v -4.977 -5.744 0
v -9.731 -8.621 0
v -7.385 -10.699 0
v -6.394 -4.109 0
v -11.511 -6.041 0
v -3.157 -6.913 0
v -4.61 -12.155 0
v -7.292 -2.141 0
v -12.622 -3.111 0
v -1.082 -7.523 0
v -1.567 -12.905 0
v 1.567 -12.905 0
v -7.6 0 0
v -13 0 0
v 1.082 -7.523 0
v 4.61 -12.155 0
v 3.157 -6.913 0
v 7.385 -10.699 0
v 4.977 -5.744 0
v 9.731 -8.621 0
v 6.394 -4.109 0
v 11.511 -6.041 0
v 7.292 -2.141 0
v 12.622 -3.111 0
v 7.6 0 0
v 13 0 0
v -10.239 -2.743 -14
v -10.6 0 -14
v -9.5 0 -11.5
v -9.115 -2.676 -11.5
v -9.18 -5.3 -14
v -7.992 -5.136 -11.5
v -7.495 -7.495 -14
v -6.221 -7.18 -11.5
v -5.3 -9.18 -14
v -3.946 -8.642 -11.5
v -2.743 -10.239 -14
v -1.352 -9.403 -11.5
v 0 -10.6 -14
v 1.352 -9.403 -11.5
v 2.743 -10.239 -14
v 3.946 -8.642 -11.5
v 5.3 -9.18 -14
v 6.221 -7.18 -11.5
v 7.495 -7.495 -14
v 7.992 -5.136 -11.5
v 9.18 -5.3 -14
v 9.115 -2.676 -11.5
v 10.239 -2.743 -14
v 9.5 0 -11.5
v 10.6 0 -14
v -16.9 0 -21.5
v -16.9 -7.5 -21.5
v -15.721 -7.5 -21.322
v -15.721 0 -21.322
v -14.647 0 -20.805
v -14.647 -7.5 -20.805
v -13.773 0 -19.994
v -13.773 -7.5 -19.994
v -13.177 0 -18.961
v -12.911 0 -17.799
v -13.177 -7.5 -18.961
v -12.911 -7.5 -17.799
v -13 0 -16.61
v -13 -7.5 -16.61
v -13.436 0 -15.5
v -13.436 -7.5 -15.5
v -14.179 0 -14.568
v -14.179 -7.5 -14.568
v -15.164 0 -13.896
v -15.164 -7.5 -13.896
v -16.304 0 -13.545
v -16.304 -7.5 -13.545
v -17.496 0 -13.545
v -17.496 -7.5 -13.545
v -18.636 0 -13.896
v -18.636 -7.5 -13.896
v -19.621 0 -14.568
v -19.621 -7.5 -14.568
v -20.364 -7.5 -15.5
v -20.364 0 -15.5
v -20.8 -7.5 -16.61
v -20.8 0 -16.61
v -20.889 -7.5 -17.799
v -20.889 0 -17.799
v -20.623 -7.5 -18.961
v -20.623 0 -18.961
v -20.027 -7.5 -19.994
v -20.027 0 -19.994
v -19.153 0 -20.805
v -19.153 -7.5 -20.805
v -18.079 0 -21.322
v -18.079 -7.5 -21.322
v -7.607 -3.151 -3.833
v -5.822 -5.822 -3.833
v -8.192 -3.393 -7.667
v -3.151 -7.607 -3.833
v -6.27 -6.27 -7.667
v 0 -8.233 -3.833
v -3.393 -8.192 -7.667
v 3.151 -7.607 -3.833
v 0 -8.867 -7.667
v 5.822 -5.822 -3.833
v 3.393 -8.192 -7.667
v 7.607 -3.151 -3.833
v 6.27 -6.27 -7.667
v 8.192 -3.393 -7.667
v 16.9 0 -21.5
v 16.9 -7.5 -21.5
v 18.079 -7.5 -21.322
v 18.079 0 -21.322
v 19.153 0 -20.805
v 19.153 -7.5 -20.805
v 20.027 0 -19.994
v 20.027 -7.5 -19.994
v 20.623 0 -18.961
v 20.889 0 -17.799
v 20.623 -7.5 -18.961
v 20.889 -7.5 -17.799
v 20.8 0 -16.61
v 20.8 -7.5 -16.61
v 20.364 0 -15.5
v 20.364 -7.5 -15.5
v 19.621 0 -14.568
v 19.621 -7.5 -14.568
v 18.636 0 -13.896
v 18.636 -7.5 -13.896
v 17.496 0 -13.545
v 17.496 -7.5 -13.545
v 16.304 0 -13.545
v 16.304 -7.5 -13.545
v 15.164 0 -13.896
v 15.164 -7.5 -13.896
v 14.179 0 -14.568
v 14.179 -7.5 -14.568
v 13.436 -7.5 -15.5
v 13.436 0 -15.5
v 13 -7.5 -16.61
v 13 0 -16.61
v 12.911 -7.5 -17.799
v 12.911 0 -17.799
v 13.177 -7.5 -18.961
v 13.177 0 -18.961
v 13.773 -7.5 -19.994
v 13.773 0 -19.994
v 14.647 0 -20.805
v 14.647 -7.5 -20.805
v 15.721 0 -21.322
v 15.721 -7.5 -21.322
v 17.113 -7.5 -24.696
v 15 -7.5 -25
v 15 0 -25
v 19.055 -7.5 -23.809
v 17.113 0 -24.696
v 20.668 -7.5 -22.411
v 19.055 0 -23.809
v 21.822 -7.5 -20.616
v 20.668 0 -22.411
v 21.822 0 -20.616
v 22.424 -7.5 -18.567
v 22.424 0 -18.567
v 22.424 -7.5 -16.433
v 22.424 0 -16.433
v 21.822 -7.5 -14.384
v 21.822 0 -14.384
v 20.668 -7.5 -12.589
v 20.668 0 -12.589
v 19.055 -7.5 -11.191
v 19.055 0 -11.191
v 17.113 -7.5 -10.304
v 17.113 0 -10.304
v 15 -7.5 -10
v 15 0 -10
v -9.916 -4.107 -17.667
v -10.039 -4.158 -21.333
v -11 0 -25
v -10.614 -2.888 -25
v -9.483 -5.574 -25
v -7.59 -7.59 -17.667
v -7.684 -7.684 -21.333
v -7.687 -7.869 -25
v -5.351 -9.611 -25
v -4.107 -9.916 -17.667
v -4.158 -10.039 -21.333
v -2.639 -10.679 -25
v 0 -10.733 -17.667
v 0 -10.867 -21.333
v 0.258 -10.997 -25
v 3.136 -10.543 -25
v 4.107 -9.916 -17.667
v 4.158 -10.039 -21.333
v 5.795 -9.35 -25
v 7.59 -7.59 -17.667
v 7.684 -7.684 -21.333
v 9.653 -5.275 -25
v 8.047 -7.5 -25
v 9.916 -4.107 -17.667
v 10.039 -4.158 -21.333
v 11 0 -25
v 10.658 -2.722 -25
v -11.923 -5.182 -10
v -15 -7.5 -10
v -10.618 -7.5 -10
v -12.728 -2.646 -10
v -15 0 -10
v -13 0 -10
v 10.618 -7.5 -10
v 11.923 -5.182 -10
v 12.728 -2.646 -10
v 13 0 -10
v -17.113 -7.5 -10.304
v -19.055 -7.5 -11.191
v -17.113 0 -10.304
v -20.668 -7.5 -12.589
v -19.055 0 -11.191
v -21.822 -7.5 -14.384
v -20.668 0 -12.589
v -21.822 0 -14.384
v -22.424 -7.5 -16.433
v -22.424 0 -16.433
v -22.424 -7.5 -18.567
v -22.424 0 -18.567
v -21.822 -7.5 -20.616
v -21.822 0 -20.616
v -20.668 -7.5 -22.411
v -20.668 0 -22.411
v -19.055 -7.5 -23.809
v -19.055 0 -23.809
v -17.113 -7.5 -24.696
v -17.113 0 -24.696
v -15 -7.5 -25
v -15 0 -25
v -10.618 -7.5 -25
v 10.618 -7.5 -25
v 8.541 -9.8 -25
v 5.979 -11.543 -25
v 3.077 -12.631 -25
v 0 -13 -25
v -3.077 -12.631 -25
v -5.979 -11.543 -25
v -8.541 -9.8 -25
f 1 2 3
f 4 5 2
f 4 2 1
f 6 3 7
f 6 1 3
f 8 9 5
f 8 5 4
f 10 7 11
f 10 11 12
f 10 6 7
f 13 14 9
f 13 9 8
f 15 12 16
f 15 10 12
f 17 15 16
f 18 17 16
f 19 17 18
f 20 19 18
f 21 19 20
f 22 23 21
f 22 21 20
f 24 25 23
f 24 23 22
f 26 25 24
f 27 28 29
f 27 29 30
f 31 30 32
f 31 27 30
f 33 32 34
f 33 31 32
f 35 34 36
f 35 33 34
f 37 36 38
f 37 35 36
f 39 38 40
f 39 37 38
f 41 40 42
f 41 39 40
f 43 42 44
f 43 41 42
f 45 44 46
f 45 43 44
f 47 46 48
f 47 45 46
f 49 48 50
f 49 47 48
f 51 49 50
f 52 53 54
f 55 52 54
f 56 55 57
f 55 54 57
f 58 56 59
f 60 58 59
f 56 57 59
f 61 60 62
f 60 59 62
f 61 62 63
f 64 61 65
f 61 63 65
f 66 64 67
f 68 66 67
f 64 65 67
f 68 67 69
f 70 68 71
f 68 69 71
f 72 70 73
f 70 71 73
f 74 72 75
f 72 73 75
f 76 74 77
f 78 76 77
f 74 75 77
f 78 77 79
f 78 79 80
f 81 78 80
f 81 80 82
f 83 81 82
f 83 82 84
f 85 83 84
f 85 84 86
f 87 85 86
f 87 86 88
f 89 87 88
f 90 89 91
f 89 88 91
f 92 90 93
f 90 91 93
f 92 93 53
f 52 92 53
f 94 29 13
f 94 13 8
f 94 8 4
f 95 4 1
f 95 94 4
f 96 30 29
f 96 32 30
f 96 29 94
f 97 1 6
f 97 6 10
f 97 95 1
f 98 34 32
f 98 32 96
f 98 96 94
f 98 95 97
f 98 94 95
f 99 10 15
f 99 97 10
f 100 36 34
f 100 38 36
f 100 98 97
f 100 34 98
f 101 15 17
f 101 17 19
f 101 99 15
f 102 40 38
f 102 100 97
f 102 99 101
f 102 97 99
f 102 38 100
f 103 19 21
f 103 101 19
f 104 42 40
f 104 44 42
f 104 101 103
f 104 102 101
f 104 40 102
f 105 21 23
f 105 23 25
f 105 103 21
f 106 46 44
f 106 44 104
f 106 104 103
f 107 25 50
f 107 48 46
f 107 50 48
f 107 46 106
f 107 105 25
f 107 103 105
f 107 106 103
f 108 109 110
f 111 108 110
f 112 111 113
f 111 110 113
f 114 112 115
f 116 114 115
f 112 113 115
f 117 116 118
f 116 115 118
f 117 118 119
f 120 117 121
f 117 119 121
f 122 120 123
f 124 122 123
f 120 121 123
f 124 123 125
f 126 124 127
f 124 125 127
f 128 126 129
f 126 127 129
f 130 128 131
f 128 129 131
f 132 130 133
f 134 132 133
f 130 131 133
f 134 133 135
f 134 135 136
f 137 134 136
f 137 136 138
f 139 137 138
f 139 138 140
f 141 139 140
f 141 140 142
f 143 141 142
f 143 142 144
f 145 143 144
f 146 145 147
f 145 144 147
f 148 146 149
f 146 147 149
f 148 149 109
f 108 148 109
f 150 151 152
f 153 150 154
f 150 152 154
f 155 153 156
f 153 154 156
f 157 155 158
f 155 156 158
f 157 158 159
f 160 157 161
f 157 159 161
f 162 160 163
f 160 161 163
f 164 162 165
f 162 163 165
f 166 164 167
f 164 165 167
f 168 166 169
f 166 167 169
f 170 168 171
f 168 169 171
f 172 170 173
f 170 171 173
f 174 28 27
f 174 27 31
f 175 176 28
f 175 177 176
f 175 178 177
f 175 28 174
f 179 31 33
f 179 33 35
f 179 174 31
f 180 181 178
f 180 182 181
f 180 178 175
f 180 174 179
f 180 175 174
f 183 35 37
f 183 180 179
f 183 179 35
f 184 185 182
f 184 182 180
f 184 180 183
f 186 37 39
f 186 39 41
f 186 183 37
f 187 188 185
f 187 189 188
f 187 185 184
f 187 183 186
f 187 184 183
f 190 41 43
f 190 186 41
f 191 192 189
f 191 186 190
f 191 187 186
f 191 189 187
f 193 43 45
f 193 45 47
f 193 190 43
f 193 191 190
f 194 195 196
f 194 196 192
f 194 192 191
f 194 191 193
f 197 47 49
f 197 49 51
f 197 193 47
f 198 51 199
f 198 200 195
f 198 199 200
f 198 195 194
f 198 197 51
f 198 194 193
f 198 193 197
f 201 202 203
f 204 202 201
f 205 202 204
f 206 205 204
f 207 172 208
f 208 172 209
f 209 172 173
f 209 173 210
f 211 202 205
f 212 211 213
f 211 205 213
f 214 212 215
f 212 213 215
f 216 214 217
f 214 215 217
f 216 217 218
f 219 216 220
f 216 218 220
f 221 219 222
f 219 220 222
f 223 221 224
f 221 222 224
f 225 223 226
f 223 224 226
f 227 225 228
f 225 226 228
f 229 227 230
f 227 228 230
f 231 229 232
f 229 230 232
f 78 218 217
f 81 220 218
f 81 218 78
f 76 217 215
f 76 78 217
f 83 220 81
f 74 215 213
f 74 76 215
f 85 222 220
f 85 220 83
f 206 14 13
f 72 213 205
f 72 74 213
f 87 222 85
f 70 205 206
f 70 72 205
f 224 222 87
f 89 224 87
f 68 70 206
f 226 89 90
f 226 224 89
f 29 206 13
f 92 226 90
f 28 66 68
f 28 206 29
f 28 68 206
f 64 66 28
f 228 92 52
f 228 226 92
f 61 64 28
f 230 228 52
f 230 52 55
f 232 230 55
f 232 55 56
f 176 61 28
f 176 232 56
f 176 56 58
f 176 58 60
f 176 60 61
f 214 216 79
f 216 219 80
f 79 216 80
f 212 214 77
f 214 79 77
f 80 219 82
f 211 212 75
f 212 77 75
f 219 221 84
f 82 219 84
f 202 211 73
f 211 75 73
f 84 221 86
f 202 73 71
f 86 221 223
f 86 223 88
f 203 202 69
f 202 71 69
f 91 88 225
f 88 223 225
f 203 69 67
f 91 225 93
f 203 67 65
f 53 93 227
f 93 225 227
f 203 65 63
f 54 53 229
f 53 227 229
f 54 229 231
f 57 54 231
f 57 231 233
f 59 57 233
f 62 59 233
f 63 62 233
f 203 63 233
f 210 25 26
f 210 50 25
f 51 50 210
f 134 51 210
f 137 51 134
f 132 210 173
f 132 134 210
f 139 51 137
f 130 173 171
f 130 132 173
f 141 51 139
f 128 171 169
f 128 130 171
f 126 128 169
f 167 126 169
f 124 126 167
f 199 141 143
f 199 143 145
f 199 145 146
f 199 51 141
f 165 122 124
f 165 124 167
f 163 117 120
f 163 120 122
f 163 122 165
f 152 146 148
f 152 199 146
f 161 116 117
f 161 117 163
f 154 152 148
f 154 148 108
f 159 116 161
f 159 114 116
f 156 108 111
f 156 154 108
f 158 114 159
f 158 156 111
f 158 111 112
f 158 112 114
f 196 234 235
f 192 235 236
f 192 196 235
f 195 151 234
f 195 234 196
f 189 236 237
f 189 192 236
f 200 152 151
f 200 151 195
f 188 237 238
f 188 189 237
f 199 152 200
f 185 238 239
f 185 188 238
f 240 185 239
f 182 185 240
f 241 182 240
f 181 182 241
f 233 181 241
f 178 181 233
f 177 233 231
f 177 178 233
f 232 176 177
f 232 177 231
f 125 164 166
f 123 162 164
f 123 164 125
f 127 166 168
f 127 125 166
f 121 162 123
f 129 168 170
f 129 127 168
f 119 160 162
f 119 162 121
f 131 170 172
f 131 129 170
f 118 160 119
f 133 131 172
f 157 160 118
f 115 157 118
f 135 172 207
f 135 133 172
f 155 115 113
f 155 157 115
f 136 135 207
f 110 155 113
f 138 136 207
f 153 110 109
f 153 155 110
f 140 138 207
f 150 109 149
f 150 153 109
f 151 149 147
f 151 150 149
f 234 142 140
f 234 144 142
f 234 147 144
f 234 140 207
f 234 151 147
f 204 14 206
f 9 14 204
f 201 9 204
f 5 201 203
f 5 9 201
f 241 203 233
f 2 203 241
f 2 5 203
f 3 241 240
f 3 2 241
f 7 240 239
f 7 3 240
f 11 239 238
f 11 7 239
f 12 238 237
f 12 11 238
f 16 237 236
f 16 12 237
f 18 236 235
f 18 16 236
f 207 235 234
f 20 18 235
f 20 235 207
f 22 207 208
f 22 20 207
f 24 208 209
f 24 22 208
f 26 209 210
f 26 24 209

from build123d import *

# Parameters (mm, degrees)
SKETCH1_R             = 13
BOSS_EXTRUDE1_DEPTH   = 25
BOSS_EXTRUDE2_DEPTH   = 7.5
BOSS_EXTRUDE2_2_DEPTH = 7.5
BOSS_EXTRUDE3_DEPTH   = 15
SKETCH5_R             = 3
CUT_EXTRUDE1_DEPTH    = 40.389084782
SKETCH6_R             = 4.45
CUT_EXTRUDE2_DEPTH    = 3
SKETCH7_R             = 4
CUT_EXTRUDE3_DEPTH    = 7.5
SKETCH8_W             = 50
SKETCH8_H             = 50
CUT_EXTRUDE4_DEPTH    = 37.058979464


with BuildPart() as part:
    # Sketch1 → Boss-Extrude1 (new body)
    with BuildSketch(Plane.XY):
        Circle(SKETCH1_R)
    extrude(amount=-BOSS_EXTRUDE1_DEPTH)

    # Sketch2 → Cut-Revolve1 (revolve, cut)
    with BuildSketch(Plane(origin=(0, 0, 0), x_dir=(0, 0, -1), z_dir=(1, 0, 0)), mode=Mode.PRIVATE) as cut_revolve1_sk:
        Polygon((0, 0), (0, 7.6), (11.5, 9.5), (14, 10.6), (25, 11), (25, 0), align=None)
    revolve(cut_revolve1_sk.sketch.rotate(Axis((0, 0, -25), (0, 0, 1)), 90), axis=Axis((0, 0, -25), (0, 0, 1)), mode=Mode.SUBTRACT)



with BuildPart() as body_2:
    # Sketch3 → Boss-Extrude2 (new, symmetric)
    with BuildSketch(Plane(origin=(0, 0, 0), x_dir=(1, 0, 0), z_dir=(0, 1, 0))):
        with BuildLine():
            Line((-13, 25), (-13, 10))
            Line((-13, 10), (-15, 10))
            ThreePointArc((-15, 10), (-22.5, 17.5), (-15, 25))
            Line((-15, 25), (-13, 25))
        make_face()
    extrude(amount=BOSS_EXTRUDE2_DEPTH, both=True)


with BuildPart() as body_3:
    # Sketch3 → Boss-Extrude2 2 (new, symmetric)
    with BuildSketch(Plane(origin=(0, 0, 0), x_dir=(1, 0, 0), z_dir=(0, 1, 0))):
        with BuildLine():
            Line((13, 25), (15, 25))
            ThreePointArc((15, 25), (22.5, 17.5), (15, 10))
            Line((15, 10), (13, 10))
            Line((13, 10), (13, 25))
        make_face()
    extrude(amount=BOSS_EXTRUDE2_2_DEPTH, both=True)


with BuildPart() as part_1:
    add(part.part)

    add(body_2.part)  # Boss-Extrude3 merges body 2

    add(body_3.part)  # Boss-Extrude3 merges body 3
    # Sketch4 → Boss-Extrude3 (add)
    with BuildSketch(Plane(origin=(0, 0, -25), x_dir=(-1, 0, 0), z_dir=(0, 0, -1))):
        with BuildLine():
            Line((-13, 7.5), (-13, -7.5))
            Line((-13, -7.5), (-8.04673847, -7.5))
            ThreePointArc((-8.04673847, -7.5), (-11, 0), (-8.04673847, 7.5))
            Line((-8.04673847, 7.5), (-13, 7.5))
        make_face()
        with BuildLine():
            Line((13, 7.5), (13, -7.5))
            Line((13, -7.5), (8.04673847, -7.5))
            ThreePointArc((8.04673847, -7.5), (11, 0), (8.04673847, 7.5))
            Line((8.04673847, 7.5), (13, 7.5))
        make_face()
    extrude(amount=-BOSS_EXTRUDE3_DEPTH)

    # Sketch5 → Cut-Extrude1 (cut, through all)
    with BuildSketch(Plane(origin=(0, 7.5, 0), x_dir=(1, 0, 0), z_dir=(0, 1, 0))):
        with Locations(Location((16.9, 17.5, 0), (0, 0, 270))):
            Circle(SKETCH5_R)
        with Locations(Location((-16.9, 17.5, 0), (0, 0, 270))):
            Circle(SKETCH5_R)
    extrude(amount=-CUT_EXTRUDE1_DEPTH, mode=Mode.SUBTRACT)

    # Sketch6 → Cut-Extrude2 (cut)
    with BuildSketch(Plane(origin=(0, 7.5, 0), x_dir=(1, 0, 0), z_dir=(0, 1, 0))):
        with Locations(Location((-16.9, 17.5, 0), (0, 0, 270))):
            Circle(SKETCH6_R)
        with Locations(Location((16.9, 17.5, 0), (0, 0, 270))):
            Circle(SKETCH6_R)
    extrude(amount=-CUT_EXTRUDE2_DEPTH, mode=Mode.SUBTRACT)

    # Sketch7 → Cut-Extrude3 (cut)
    with BuildSketch(Plane.XZ.offset(7.5)):
        with Locations(Location((-16.9, -17.5, 0), (0, 0, 270))):
            Circle(SKETCH7_R)
        with Locations(Location((16.9, -17.5, 0), (0, 0, 270))):
            Circle(SKETCH7_R)
    extrude(amount=-CUT_EXTRUDE3_DEPTH, mode=Mode.SUBTRACT)

    # Sketch8 → Cut-Extrude4 (cut, through all)
    with BuildSketch(Plane(origin=(0, 0, 0), x_dir=(1, 0, 0), z_dir=(0, 1, 0))):
        with Locations((0, 14.017641389)):
            Rectangle(SKETCH8_W, SKETCH8_H)
    extrude(amount=CUT_EXTRUDE4_DEPTH, mode=Mode.SUBTRACT)


solid = part_1.part
